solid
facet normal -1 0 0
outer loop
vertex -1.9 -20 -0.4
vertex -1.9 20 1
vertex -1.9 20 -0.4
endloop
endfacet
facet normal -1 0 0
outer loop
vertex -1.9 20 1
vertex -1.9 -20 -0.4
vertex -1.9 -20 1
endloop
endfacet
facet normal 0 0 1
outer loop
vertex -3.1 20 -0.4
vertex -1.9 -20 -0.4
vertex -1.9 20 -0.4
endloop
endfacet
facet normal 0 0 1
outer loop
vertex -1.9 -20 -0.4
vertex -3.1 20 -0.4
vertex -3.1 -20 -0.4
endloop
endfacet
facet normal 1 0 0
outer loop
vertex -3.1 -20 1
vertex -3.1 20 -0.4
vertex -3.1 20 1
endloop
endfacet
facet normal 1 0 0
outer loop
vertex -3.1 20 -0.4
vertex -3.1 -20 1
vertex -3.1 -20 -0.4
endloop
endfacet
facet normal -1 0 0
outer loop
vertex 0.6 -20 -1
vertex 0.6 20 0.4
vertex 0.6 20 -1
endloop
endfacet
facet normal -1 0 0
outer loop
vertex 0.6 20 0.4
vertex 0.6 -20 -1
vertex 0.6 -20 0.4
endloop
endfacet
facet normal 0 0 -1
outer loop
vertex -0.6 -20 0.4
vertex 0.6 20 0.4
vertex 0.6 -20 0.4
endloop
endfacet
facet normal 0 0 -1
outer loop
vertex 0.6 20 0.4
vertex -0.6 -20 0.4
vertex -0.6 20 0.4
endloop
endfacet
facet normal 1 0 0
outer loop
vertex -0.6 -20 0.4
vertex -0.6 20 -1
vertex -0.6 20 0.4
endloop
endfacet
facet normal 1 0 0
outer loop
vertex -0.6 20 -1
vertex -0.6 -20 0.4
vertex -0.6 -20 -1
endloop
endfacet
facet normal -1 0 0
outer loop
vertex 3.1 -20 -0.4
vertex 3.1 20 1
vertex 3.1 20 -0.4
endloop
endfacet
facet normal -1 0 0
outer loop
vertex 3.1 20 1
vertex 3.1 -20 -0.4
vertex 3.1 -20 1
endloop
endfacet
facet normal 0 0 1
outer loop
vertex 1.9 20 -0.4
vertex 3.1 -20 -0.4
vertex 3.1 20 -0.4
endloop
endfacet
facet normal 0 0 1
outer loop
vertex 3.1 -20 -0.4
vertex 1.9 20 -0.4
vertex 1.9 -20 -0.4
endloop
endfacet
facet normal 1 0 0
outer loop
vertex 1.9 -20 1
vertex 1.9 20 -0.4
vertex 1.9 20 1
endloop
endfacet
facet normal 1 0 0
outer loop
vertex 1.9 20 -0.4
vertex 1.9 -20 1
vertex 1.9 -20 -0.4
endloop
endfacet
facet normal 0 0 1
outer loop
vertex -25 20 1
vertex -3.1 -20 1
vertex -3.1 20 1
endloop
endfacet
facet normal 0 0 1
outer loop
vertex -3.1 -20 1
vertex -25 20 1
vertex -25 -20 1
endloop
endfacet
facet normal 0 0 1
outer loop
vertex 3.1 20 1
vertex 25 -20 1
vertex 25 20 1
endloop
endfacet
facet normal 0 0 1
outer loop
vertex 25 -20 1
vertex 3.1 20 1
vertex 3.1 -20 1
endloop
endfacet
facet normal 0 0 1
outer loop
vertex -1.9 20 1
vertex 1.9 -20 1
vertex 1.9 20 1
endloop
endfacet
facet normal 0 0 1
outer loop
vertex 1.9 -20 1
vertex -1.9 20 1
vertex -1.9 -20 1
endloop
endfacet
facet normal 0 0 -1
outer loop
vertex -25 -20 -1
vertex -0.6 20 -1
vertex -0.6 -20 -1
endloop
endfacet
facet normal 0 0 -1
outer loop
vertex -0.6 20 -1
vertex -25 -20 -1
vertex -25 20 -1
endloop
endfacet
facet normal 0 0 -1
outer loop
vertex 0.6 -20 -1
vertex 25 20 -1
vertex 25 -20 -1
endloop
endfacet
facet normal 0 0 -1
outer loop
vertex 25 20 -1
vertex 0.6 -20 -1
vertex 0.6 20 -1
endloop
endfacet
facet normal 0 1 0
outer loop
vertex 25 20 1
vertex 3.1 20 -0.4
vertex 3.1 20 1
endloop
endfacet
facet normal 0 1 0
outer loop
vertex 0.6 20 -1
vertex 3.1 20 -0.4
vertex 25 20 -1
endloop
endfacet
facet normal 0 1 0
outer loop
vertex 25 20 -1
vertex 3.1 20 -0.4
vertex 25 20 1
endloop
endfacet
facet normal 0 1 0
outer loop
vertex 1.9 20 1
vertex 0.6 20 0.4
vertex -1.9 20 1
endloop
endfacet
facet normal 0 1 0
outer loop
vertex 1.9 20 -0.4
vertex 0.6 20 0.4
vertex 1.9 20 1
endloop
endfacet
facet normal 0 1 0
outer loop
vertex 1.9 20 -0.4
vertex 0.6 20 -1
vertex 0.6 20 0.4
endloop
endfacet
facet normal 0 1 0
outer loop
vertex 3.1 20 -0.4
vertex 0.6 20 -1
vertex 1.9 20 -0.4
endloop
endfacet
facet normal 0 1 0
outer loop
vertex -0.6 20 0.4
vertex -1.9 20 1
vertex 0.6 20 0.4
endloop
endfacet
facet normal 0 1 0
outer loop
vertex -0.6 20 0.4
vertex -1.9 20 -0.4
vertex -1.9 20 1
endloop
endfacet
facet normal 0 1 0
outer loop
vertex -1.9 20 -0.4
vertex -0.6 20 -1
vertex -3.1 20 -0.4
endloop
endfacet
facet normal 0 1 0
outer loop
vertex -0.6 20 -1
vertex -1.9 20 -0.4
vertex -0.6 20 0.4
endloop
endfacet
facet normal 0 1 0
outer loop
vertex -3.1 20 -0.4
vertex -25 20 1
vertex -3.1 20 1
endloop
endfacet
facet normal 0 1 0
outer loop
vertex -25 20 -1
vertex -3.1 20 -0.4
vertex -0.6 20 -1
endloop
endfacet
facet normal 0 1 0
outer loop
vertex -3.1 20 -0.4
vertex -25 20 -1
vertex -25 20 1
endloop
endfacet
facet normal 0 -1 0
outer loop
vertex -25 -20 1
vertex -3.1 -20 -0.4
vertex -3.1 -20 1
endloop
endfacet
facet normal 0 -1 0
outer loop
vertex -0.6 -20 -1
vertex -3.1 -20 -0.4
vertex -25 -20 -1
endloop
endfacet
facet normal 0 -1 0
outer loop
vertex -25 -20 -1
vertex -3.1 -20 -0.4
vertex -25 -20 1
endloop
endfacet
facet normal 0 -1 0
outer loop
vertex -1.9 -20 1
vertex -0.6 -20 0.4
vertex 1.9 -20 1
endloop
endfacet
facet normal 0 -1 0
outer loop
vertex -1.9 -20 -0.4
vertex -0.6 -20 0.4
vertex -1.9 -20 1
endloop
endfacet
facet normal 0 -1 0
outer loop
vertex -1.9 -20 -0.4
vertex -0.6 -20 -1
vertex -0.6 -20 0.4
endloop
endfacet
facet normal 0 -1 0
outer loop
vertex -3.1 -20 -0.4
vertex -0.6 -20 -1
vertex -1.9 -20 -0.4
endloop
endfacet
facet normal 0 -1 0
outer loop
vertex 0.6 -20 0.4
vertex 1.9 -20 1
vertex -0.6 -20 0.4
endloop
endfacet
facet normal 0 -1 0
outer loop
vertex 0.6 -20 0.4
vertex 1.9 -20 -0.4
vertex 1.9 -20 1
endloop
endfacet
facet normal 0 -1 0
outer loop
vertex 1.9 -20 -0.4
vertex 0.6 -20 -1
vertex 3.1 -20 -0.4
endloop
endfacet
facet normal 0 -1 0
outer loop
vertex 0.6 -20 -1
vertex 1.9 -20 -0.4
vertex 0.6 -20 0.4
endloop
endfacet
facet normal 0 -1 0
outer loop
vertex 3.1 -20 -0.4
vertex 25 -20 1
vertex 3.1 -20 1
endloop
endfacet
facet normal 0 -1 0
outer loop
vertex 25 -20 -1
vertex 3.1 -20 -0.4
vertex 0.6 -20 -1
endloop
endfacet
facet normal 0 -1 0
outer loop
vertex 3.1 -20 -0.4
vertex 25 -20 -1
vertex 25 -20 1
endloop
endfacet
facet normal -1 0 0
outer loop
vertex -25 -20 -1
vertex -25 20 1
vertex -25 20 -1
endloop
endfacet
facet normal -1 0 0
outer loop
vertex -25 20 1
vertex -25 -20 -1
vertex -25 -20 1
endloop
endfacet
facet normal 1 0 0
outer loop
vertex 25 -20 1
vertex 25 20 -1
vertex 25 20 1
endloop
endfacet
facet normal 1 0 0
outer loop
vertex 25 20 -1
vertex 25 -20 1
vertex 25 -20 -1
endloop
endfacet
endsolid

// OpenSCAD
// @github: morganp/OpenSCAD_hinge
include <../hinge_library.scad>

// shown embedded in a token slab of parent material either side, so the
// groove geometry is visible in context
union() {
    translate([-15, 0, 0]) cube([20, 40, 2], center=true);
    translate([15, 0, 0]) cube([20, 40, 2], center=true);
    living_hinge(
        width         = 40,
        length        = 10,
        thickness     = 2,
        web_thickness = 0.6,
        groove_count  = 3,
        groove_width  = 1.2
    );
}
